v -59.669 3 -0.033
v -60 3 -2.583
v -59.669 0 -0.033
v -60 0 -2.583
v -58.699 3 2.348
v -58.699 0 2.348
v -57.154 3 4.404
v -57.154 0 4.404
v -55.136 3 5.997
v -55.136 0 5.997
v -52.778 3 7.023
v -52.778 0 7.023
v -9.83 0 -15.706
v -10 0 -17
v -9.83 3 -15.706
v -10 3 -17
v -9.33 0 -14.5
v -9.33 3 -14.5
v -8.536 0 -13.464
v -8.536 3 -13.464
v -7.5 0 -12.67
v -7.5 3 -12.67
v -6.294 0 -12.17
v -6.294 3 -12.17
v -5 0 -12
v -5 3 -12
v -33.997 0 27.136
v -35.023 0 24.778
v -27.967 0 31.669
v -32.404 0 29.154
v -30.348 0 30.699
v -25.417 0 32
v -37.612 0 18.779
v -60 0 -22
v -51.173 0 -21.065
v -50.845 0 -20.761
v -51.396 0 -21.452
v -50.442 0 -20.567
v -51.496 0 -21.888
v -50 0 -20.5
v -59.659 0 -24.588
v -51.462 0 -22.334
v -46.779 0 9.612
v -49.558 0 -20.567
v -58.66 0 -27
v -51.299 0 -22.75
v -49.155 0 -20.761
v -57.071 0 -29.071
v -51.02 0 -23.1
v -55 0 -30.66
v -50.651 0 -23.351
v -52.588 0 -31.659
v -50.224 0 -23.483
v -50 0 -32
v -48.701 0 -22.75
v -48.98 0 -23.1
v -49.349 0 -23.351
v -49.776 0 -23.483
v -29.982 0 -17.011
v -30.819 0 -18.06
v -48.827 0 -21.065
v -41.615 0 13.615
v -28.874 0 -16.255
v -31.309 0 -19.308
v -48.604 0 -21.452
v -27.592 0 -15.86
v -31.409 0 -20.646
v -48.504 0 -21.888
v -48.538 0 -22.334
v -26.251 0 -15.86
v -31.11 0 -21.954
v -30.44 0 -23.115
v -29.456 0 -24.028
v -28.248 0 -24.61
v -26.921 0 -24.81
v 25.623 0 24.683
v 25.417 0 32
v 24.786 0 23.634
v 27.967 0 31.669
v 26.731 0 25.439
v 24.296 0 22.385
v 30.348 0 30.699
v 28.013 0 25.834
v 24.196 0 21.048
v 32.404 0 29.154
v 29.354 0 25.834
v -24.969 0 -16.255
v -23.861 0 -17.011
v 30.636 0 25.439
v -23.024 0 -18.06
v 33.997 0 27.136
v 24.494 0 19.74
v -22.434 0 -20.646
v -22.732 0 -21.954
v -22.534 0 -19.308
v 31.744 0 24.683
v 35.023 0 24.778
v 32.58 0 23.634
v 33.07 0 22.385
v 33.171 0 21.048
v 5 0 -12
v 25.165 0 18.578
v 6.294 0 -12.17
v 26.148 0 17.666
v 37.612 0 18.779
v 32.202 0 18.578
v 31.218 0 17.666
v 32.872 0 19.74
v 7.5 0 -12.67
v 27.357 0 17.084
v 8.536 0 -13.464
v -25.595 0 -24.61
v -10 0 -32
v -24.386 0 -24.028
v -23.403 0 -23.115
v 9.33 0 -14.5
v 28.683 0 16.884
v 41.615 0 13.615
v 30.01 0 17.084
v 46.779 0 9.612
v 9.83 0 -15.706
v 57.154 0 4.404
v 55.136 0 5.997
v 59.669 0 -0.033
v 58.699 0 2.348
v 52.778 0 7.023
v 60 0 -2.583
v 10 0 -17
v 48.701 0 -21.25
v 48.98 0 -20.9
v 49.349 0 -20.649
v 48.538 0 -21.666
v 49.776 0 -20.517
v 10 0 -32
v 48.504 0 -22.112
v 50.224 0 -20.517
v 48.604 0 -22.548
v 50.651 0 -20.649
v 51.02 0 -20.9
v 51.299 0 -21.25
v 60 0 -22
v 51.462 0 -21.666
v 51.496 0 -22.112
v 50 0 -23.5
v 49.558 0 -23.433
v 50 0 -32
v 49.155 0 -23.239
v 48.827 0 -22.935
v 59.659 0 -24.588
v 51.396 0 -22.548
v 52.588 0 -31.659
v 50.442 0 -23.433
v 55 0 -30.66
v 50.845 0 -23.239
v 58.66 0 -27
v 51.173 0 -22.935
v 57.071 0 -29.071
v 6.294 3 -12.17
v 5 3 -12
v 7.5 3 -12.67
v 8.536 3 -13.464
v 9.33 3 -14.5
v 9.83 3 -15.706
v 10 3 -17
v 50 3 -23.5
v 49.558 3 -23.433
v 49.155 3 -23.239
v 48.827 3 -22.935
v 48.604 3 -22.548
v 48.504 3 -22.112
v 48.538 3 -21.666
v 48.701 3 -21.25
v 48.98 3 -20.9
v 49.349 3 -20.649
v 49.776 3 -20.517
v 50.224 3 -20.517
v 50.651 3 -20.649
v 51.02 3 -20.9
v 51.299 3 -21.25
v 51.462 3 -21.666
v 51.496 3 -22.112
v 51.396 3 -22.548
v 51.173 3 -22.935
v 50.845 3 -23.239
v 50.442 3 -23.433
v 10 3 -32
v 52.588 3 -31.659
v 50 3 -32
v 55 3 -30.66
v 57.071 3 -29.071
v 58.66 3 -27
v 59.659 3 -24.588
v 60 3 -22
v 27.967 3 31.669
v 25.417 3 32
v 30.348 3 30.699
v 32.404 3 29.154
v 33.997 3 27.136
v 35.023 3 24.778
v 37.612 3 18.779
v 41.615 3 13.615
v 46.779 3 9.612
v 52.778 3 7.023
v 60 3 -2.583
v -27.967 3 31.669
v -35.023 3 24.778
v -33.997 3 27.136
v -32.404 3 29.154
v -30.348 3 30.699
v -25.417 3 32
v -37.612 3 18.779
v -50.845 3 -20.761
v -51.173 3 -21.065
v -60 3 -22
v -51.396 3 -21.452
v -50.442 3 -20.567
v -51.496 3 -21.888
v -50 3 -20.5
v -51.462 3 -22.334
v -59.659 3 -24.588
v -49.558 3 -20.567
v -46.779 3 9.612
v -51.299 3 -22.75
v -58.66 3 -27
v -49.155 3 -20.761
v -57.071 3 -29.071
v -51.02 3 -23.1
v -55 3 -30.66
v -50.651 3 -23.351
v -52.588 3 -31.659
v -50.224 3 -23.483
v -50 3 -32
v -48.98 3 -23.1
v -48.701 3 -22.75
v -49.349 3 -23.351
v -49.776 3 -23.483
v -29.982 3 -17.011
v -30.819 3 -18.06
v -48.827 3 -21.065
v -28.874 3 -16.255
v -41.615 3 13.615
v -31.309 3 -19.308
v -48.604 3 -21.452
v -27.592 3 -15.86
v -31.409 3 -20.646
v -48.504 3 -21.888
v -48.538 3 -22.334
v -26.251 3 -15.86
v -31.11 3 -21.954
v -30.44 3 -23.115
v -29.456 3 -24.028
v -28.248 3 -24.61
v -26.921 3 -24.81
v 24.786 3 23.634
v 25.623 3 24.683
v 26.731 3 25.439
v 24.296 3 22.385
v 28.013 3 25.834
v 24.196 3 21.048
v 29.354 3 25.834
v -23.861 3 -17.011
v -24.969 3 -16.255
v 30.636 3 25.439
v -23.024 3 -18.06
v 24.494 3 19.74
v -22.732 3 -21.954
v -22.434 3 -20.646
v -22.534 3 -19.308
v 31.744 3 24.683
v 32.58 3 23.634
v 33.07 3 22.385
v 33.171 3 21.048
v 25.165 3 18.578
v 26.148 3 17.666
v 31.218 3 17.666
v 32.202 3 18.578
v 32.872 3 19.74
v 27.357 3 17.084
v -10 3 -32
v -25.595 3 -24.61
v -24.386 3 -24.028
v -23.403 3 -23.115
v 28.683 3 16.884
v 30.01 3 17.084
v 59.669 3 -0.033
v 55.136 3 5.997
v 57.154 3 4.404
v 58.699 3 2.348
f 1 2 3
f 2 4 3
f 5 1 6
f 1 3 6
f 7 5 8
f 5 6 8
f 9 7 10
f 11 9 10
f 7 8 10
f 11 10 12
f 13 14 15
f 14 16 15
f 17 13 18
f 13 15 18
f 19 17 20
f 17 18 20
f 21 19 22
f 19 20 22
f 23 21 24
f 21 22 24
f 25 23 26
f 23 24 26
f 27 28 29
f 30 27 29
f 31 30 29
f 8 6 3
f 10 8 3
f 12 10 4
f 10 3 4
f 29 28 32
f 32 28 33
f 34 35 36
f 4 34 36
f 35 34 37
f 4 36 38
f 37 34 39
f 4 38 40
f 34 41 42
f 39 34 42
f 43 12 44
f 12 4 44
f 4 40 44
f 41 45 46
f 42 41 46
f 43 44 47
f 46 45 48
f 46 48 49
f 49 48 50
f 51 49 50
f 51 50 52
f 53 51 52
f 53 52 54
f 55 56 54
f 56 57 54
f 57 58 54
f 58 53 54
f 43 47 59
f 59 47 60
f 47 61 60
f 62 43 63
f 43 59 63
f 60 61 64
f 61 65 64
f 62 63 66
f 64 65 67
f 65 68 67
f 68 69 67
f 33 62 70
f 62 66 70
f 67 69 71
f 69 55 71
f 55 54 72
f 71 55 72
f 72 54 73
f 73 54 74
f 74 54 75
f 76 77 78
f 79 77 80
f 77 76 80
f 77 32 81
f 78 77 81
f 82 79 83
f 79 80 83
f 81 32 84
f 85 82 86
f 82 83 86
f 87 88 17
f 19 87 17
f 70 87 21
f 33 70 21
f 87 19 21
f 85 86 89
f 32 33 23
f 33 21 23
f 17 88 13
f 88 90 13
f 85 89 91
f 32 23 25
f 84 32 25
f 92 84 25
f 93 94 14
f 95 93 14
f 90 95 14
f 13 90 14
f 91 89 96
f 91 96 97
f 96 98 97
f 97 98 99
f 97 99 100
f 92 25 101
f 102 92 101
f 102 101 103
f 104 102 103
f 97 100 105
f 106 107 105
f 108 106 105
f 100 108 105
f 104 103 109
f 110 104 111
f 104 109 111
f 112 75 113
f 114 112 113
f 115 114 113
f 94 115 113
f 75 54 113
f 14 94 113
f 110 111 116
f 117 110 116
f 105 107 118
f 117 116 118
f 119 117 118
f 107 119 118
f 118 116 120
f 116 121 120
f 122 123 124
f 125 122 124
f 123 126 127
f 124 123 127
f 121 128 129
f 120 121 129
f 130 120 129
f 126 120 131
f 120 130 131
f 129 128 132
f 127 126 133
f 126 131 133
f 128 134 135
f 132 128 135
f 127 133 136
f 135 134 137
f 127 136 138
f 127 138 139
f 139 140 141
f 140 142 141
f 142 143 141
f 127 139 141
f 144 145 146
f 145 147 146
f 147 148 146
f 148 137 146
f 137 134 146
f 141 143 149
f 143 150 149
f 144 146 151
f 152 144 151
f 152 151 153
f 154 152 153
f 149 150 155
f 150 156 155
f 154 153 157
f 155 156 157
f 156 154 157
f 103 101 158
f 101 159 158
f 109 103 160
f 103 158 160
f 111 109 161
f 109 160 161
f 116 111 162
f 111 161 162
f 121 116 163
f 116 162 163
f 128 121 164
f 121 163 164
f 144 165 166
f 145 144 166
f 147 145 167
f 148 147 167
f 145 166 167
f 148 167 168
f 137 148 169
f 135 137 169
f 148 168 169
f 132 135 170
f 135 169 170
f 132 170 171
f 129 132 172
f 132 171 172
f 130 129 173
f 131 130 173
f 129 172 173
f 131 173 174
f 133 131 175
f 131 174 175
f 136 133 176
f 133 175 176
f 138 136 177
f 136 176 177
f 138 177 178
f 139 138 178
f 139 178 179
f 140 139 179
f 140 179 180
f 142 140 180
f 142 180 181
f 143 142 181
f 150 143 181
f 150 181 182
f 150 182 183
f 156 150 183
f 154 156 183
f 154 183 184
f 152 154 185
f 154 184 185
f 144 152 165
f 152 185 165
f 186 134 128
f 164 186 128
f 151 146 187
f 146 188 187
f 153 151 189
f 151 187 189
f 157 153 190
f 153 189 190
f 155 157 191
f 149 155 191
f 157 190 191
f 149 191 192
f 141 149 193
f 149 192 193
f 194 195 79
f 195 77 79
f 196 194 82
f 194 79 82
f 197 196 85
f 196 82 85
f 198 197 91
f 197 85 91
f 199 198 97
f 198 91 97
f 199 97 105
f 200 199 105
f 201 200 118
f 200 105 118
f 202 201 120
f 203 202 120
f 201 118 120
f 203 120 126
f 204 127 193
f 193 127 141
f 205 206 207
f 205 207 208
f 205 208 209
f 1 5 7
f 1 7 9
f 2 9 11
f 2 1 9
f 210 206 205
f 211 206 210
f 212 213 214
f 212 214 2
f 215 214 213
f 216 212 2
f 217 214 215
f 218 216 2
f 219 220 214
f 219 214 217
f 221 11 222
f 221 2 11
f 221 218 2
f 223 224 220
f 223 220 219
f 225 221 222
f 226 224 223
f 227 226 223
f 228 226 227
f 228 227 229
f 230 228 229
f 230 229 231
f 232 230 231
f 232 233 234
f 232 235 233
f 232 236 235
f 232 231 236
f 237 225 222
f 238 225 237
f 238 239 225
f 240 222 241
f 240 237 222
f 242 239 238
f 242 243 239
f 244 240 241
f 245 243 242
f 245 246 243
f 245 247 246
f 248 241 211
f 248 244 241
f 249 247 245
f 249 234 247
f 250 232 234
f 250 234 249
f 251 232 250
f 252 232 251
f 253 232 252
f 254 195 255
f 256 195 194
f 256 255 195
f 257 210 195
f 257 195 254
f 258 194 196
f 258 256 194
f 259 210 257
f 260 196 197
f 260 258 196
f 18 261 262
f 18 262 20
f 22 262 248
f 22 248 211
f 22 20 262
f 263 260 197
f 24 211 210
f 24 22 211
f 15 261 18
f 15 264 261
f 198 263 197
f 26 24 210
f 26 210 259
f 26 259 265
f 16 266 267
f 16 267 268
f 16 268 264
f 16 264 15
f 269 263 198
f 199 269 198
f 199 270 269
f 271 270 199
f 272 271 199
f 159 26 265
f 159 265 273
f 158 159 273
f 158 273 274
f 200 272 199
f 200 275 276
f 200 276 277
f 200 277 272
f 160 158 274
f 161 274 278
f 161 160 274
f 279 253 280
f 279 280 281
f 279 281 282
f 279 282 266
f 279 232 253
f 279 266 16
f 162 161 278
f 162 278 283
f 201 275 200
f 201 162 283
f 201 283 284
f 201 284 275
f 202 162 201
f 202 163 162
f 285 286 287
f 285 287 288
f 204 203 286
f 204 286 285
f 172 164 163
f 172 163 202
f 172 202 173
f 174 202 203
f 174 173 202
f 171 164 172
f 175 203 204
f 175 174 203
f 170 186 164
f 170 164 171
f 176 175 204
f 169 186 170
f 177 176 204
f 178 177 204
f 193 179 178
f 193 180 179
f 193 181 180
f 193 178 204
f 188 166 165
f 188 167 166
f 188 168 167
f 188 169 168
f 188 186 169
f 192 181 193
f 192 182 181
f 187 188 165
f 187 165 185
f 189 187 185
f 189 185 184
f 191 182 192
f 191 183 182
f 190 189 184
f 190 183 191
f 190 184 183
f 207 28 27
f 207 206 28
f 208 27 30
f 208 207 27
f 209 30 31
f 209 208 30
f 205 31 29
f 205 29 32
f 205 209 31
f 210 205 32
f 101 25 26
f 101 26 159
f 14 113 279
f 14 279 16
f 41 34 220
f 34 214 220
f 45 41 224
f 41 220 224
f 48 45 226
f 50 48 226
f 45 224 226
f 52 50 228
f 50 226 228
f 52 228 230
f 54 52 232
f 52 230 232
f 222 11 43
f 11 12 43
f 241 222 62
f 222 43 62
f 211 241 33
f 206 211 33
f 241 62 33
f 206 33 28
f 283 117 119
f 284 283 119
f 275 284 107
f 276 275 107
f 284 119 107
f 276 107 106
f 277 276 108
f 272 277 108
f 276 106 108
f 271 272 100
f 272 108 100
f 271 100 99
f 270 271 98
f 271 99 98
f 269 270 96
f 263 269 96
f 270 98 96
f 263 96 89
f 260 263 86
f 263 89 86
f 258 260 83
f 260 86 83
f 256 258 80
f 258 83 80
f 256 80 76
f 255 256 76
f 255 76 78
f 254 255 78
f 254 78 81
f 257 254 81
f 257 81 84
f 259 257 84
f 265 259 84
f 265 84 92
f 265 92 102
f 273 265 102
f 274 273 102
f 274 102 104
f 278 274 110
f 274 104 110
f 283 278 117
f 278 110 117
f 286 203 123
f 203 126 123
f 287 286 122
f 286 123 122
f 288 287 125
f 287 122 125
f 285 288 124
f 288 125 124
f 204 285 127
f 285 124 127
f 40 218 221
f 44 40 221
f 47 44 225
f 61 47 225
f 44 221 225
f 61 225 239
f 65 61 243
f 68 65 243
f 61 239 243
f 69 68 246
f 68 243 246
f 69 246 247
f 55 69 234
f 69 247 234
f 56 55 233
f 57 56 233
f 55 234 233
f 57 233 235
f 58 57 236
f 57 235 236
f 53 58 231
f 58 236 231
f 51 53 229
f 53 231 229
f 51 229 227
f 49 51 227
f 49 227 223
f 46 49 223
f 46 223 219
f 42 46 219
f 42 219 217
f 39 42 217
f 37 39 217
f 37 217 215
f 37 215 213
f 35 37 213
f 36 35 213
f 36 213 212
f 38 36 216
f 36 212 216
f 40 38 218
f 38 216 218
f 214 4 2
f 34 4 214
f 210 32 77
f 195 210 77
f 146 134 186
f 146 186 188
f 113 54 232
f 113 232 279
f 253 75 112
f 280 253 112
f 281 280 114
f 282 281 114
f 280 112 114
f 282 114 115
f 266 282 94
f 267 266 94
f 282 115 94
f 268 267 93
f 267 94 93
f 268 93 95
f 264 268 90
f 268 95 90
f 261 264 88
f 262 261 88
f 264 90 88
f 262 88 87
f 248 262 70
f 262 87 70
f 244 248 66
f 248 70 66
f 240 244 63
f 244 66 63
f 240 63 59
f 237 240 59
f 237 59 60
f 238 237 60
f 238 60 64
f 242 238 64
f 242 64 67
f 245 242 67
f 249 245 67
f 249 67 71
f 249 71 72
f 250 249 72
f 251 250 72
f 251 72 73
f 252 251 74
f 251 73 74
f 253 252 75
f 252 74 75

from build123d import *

# Parameters (mm, degrees)
SKETCH_1_W          = 120
SKETCH_1_H          = 64
EXTRUDE_1_DEPTH     = 3
SKETCH_2_R          = 1.5
CUT_EXTRUDE_1_DEPTH = 3
FILLET_1_R          = 10
SKETCH_3_W          = 20
SKETCH_3_H          = 20
CUT_EXTRUDE_2_DEPTH = 3
SKETCH_4_R          = 26
CUT_EXTRUDE_3_DEPTH = 3
FILLET_2_R          = 5
FILLET_3_R          = 10
FILLET_4_R          = 10
SKETCH_6_R          = 2.1
CUT_EXTRUDE_5_DEPTH = 6
SKETCH_7_R          = 4.5
CUT_EXTRUDE_6_DEPTH = 3


with BuildPart() as part:
    # 草图1 → 凸台-拉伸1 (new body)
    with BuildSketch(Plane(origin=(0, 0, 0), x_dir=(1, 0, 0), z_dir=(0, 1, 0))):
        Rectangle(SKETCH_1_W, SKETCH_1_H)
    extrude(amount=EXTRUDE_1_DEPTH)

    # 草图2 → 切除-拉伸1 (cut)
    with BuildSketch(Plane(origin=(0, 3, 0), x_dir=(1, 0, 0), z_dir=(0, 1, 0))):
        with Locations(Location((-50, 22, 0), (0, 0, 270))):
            Circle(SKETCH_2_R)
        with Locations(Location((50, 22, 0), (0, 0, 90))):
            Circle(SKETCH_2_R)
    extrude(amount=-CUT_EXTRUDE_1_DEPTH, mode=Mode.SUBTRACT)

    # 圆角1
    fillet_1_edges = [part.edges().sort_by_distance(p)[0] for p in [
        (-60, 1.5, -32),
        (60, 1.5, -32),
    ]]
    fillet(fillet_1_edges, radius=FILLET_1_R)

    # 草图3 → 切除-拉伸2 (cut)
    with BuildSketch(Plane.XZ):
        with Locations((0, -22)):
            Rectangle(SKETCH_3_W, SKETCH_3_H)
    extrude(amount=-CUT_EXTRUDE_2_DEPTH, mode=Mode.SUBTRACT)

    # 草图4 → 切除-拉伸3 (cut)
    with BuildSketch(Plane.XZ):
        with Locations((-60, 32)):
            Circle(SKETCH_4_R)
        with Locations((60, 32)):
            Circle(SKETCH_4_R)
    extrude(amount=-CUT_EXTRUDE_3_DEPTH, mode=Mode.SUBTRACT)

    # 圆角2
    fillet_2_edges = [part.edges().sort_by_distance(p)[0] for p in [
        (-10, 1.5, -12),
        (10, 1.5, -12),
    ]]
    fillet(fillet_2_edges, radius=FILLET_2_R)

    # 圆角3
    fillet_3_edges = [part.edges().sort_by_distance(p)[0] for p in [
        (-60, 1.5, 6),
        (60, 1.5, 6),
    ]]
    fillet(fillet_3_edges, radius=FILLET_3_R)

    # 圆角4
    fillet_4_edges = [part.edges().sort_by_distance(p)[0] for p in [
        (-34, 1.5, 32),
        (34, 1.5, 32),
    ]]
    fillet(fillet_4_edges, radius=FILLET_4_R)

    # 草图6 → 切除-拉伸5 (cut)
    with BuildSketch(Plane(origin=(0, 6, 189.146349293), x_dir=(0, 0, 1), z_dir=(0, 1, 0))):
        with Locations((-209.45594255, -26.921391455)):
            Circle(SKETCH_6_R)
        with Locations((-167.762204108, 28.683304163)):
            Circle(SKETCH_6_R)
    extrude(amount=-CUT_EXTRUDE_5_DEPTH, mode=Mode.SUBTRACT)

    # 草图7 → 切除-拉伸6 (cut)
    with BuildSketch(Plane.XZ):
        with Locations(Location((-26.921391455, -20.309593257, 0), (0, 0, 270))):
            Circle(SKETCH_7_R)
        with Locations(Location((28.683304163, 21.384145185, 0), (0, 0, 270))):
            Circle(SKETCH_7_R)
    extrude(amount=-CUT_EXTRUDE_6_DEPTH, mode=Mode.SUBTRACT)


solid = part.part
